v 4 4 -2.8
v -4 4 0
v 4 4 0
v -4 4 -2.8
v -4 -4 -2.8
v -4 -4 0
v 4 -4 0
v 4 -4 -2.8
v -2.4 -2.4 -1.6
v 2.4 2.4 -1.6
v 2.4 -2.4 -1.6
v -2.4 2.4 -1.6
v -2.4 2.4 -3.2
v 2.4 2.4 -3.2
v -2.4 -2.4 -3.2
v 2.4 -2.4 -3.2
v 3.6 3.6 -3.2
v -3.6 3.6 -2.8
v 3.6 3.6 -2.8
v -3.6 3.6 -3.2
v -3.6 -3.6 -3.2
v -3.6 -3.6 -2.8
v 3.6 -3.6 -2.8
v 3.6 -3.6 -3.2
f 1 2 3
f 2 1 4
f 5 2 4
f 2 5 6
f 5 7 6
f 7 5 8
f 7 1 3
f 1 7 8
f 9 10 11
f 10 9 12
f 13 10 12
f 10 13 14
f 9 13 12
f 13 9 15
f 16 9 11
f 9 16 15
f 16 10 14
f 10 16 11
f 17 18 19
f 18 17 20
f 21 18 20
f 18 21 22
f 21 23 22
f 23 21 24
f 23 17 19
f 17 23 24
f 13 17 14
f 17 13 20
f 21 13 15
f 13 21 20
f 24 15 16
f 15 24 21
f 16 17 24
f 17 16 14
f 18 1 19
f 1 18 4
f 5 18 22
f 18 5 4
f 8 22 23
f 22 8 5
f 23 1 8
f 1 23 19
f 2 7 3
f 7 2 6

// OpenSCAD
// file: ../p/box5.scad
use <../lib.scad>
function ldraw_lib__box5() = [
// 0 Box with 5 Faces and All Edges
// 0 Name: box5.dat
// 0 Author: James Jessiman
// 0 !LDRAW_ORG Primitive UPDATE 2012-01
// 0 !LICENSE Licensed under CC BY 4.0 : see CAreadme.txt
// 
// 0 BFC CERTIFY CCW
  [0,"BFC","CERTIFY"],
  [0,"BFC","CCW"],
// 
// 0 !HISTORY 2002-04-03 [sbliss] Modified for BFC compliance
// 0 !HISTORY 2002-04-25 [PTadmin] Official Update 2002-02
// 0 !HISTORY 2007-06-24 [PTadmin] Header formatted for Contributor Agreement
// 0 !HISTORY 2008-07-01 [PTadmin] Official Update 2008-01
// 0 !HISTORY 2012-02-16 [Philo] Changed to CCW
// 0 !HISTORY 2012-03-30 [PTadmin] Official Update 2012-01
// 
// 
// 2 24 1 1 1 -1 1 1
  [2,24,1,1,1,-1,1,1],
// 2 24 -1 1 1 -1 1 -1
  [2,24,-1,1,1,-1,1,-1],
// 2 24 -1 1 -1 1 1 -1
  [2,24,-1,1,-1,1,1,-1],
// 2 24 1 1 -1 1 1 1
  [2,24,1,1,-1,1,1,1],
// 2 24 1 0 1 -1 0 1
  [2,24,1,0,1,-1,0,1],
// 2 24 -1 0 1 -1 0 -1
  [2,24,-1,0,1,-1,0,-1],
// 2 24 -1 0 -1 1 0 -1
  [2,24,-1,0,-1,1,0,-1],
// 2 24 1 0 -1 1 0 1
  [2,24,1,0,-1,1,0,1],
// 2 24 1 0 1 1 1 1
  [2,24,1,0,1,1,1,1],
// 2 24 -1 0 1 -1 1 1
  [2,24,-1,0,1,-1,1,1],
// 2 24 1 0 -1 1 1 -1
  [2,24,1,0,-1,1,1,-1],
// 2 24 -1 0 -1 -1 1 -1
  [2,24,-1,0,-1,-1,1,-1],
// 4 16 -1 1 1 1 1 1 1 1 -1 -1 1 -1
  [4,16,-1,1,1,1,1,1,1,1,-1,-1,1,-1],
// 4 16 -1 1 1 -1 0 1 1 0 1 1 1 1
  [4,16,-1,1,1,-1,0,1,1,0,1,1,1,1],
// 4 16 -1 1 -1 -1 0 -1 -1 0 1 -1 1 1
  [4,16,-1,1,-1,-1,0,-1,-1,0,1,-1,1,1],
// 4 16 1 1 -1 1 0 -1 -1 0 -1 -1 1 -1
  [4,16,1,1,-1,1,0,-1,-1,0,-1,-1,1,-1],
// 4 16 1 1 1 1 0 1 1 0 -1 1 1 -1
  [4,16,1,1,1,1,0,1,1,0,-1,1,1,-1],
];
module ldraw_lib__box5(step=0, col=false, unit=2/5, alt=false, line=0.2, solid=!$preview)
    makepoly(ldraw_lib__box5(), step=step, col=col, unit=unit, alt=alt, line=line, solid=solid);
ldraw_lib__box5(line=0.2);
// file: ../p/box4.scad
use <../lib.scad>
function ldraw_lib__box4() = [
// 0 Box with 4 Faces (2 Parallel Pairs) and All Edges
// 0 Name: box4.dat
// 0 Author: James Jessiman
// 0 !LDRAW_ORG Primitive UPDATE 2012-01
// 0 !LICENSE Licensed under CC BY 4.0 : see CAreadme.txt
// 
// 0 BFC CERTIFY CCW
  [0,"BFC","CERTIFY"],
  [0,"BFC","CCW"],
// 
// 0 !HISTORY 2002-04-03 [sbliss] Modified for BFC compliance
// 0 !HISTORY 2002-04-25 [PTadmin] Official Update 2002-02
// 0 !HISTORY 2007-06-24 [PTadmin] Header formatted for Contributor Agreement
// 0 !HISTORY 2008-07-01 [PTadmin] Official Update 2008-01
// 0 !HISTORY 2012-02-16 [Philo] Changed to CCW
// 0 !HISTORY 2012-03-30 [PTadmin] Official Update 2012-01
// 
// 
// 2 24 1 1 1 -1 1 1
  [2,24,1,1,1,-1,1,1],
// 2 24 -1 1 1 -1 1 -1
  [2,24,-1,1,1,-1,1,-1],
// 2 24 -1 1 -1 1 1 -1
  [2,24,-1,1,-1,1,1,-1],
// 2 24 1 1 -1 1 1 1
  [2,24,1,1,-1,1,1,1],
// 2 24 1 0 1 -1 0 1
  [2,24,1,0,1,-1,0,1],
// 2 24 -1 0 1 -1 0 -1
  [2,24,-1,0,1,-1,0,-1],
// 2 24 -1 0 -1 1 0 -1
  [2,24,-1,0,-1,1,0,-1],
// 2 24 1 0 -1 1 0 1
  [2,24,1,0,-1,1,0,1],
// 2 24 1 0 1 1 1 1
  [2,24,1,0,1,1,1,1],
// 2 24 -1 0 1 -1 1 1
  [2,24,-1,0,1,-1,1,1],
// 2 24 1 0 -1 1 1 -1
  [2,24,1,0,-1,1,1,-1],
// 2 24 -1 0 -1 -1 1 -1
  [2,24,-1,0,-1,-1,1,-1],
// 4 16 -1 1 1 -1 0 1 1 0 1 1 1 1
  [4,16,-1,1,1,-1,0,1,1,0,1,1,1,1],
// 4 16 -1 1 -1 -1 0 -1 -1 0 1 -1 1 1
  [4,16,-1,1,-1,-1,0,-1,-1,0,1,-1,1,1],
// 4 16 1 1 -1 1 0 -1 -1 0 -1 -1 1 -1
  [4,16,1,1,-1,1,0,-1,-1,0,-1,-1,1,-1],
// 4 16 1 1 1 1 0 1 1 0 -1 1 1 -1
  [4,16,1,1,1,1,0,1,1,0,-1,1,1,-1],
];
module ldraw_lib__box4(step=0, col=false, unit=2/5, alt=false, line=0.2, solid=!$preview)
    makepoly(ldraw_lib__box4(), step=step, col=col, unit=unit, alt=alt, line=line, solid=solid);
ldraw_lib__box4(line=0.2);
// file: s/3070bs01.scad
use <../../lib.scad>
use <../../p/box4.scad>
use <../../p/box5.scad>
function ldraw_lib__s__3070bs01() = [
// 0 ~Tile  1 x  1 with Groove without Top Face
// 0 Name: s\3070bs01.dat
// 0 Author: Chris Dee [cwdee]
// 0 !LDRAW_ORG Subpart UPDATE 2009-02
// 0 !LICENSE Licensed under CC BY 4.0 : see CAreadme.txt
// 
// 0 BFC CERTIFY CCW
  [0,"BFC","CERTIFY"],
  [0,"BFC","CCW"],
// 
// 0 !HISTORY 2009-09-03 [PTadmin] Official Update 2009-02
// 
// 
// 1 16 0 0 0 10 0 0 0 7 0 0 0 10 box4.dat
  [1,16,0,0,0,10,0,0,0,7,0,0,0,10, ldraw_lib__box4()],
// 0 BFC INVERTNEXT
  [0,"BFC","INVERTNEXT"],
// 1 16 0 8 0 6 0 0 0 -4 0 0 0 6 box5.dat
  [1,16,0,8,0,6,0,0,0,-4,0,0,0,6, ldraw_lib__box5()],
// 1 16 0 7 0 9 0 0 0 1 0 0 0 9 box4.dat
  [1,16,0,7,0,9,0,0,0,1,0,0,0,9, ldraw_lib__box4()],
// 
// 4 16 9 8 9 6 8 6 -6 8 6 -9 8 9
  [4,16,9,8,9,6,8,6,-6,8,6,-9,8,9],
// 4 16 -9 8 9 -6 8 6 -6 8 -6 -9 8 -9
  [4,16,-9,8,9,-6,8,6,-6,8,-6,-9,8,-9],
// 4 16 -9 8 -9 -6 8 -6 6 8 -6 9 8 -9
  [4,16,-9,8,-9,-6,8,-6,6,8,-6,9,8,-9],
// 4 16 9 8 -9 6 8 -6 6 8 6 9 8 9
  [4,16,9,8,-9,6,8,-6,6,8,6,9,8,9],
// 
// 4 16 10 7 10 9 7 9 -9 7 9 -10 7 10
  [4,16,10,7,10,9,7,9,-9,7,9,-10,7,10],
// 4 16 -10 7 10 -9 7 9 -9 7 -9 -10 7 -10
  [4,16,-10,7,10,-9,7,9,-9,7,-9,-10,7,-10],
// 4 16 -10 7 -10 -9 7 -9 9 7 -9 10 7 -10
  [4,16,-10,7,-10,-9,7,-9,9,7,-9,10,7,-10],
// 4 16 10 7 -10 9 7 -9 9 7 9 10 7 10
  [4,16,10,7,-10,9,7,-9,9,7,9,10,7,10],
// 0
];
module ldraw_lib__s__3070bs01(step=0, col=false, unit=2/5, alt=false, line=0.2, solid=!$preview)
    makepoly(ldraw_lib__s__3070bs01(), step=step, col=col, unit=unit, alt=alt, line=line, solid=solid);
ldraw_lib__s__3070bs01(line=0.2);
// main file
use <../lib.scad>
use <s/3070bs01.scad>
function ldraw_lib__3070bpf2() = [
// 0 Tile  1 x  1 with White Top Pattern
// 0 Name: 3070bpf2.dat
// 0 Author: Niels Karsdorp [nielsk]
// 0 !LDRAW_ORG Part UPDATE 2004-03
// 0 !LICENSE Licensed under CC BY 4.0 : see CAreadme.txt
// 
// 0 BFC CERTIFY CCW
  [0,"BFC","CERTIFY"],
  [0,"BFC","CCW"],
// 
// 0 !KEYWORDS BrickLink 3070pb046, Rebrickable 3070bpr0004, set 4307
// 
// 0 !HISTORY 2004-09-15 [PTadmin] Official Update 2004-03
// 0 !HISTORY 2007-10-13 [PTadmin] Header formatted for Contributor Agreement
// 0 !HISTORY 2008-07-01 [PTadmin] Official Update 2008-01
// 
// 
// 1 16 0 0 0 1 0 0 0 1 0 0 0 1 s\3070bs01.dat
  [1,16,0,0,0,1,0,0,0,1,0,0,0,1, ldraw_lib__s__3070bs01()],
// 4 15 -10 0 -10 10 0 -10 10 0 10 -10 0 10
  [4,15,-10,0,-10,10,0,-10,10,0,10,-10,0,10],
// 0
];
module ldraw_lib__3070bpf2(step=0, col=false, unit=2/5, alt=false, line=0.2, solid=!$preview)
    makepoly(ldraw_lib__3070bpf2(), step=step, col=col, unit=unit, alt=alt, line=line, solid=solid);
ldraw_lib__3070bpf2(line=0.2);
